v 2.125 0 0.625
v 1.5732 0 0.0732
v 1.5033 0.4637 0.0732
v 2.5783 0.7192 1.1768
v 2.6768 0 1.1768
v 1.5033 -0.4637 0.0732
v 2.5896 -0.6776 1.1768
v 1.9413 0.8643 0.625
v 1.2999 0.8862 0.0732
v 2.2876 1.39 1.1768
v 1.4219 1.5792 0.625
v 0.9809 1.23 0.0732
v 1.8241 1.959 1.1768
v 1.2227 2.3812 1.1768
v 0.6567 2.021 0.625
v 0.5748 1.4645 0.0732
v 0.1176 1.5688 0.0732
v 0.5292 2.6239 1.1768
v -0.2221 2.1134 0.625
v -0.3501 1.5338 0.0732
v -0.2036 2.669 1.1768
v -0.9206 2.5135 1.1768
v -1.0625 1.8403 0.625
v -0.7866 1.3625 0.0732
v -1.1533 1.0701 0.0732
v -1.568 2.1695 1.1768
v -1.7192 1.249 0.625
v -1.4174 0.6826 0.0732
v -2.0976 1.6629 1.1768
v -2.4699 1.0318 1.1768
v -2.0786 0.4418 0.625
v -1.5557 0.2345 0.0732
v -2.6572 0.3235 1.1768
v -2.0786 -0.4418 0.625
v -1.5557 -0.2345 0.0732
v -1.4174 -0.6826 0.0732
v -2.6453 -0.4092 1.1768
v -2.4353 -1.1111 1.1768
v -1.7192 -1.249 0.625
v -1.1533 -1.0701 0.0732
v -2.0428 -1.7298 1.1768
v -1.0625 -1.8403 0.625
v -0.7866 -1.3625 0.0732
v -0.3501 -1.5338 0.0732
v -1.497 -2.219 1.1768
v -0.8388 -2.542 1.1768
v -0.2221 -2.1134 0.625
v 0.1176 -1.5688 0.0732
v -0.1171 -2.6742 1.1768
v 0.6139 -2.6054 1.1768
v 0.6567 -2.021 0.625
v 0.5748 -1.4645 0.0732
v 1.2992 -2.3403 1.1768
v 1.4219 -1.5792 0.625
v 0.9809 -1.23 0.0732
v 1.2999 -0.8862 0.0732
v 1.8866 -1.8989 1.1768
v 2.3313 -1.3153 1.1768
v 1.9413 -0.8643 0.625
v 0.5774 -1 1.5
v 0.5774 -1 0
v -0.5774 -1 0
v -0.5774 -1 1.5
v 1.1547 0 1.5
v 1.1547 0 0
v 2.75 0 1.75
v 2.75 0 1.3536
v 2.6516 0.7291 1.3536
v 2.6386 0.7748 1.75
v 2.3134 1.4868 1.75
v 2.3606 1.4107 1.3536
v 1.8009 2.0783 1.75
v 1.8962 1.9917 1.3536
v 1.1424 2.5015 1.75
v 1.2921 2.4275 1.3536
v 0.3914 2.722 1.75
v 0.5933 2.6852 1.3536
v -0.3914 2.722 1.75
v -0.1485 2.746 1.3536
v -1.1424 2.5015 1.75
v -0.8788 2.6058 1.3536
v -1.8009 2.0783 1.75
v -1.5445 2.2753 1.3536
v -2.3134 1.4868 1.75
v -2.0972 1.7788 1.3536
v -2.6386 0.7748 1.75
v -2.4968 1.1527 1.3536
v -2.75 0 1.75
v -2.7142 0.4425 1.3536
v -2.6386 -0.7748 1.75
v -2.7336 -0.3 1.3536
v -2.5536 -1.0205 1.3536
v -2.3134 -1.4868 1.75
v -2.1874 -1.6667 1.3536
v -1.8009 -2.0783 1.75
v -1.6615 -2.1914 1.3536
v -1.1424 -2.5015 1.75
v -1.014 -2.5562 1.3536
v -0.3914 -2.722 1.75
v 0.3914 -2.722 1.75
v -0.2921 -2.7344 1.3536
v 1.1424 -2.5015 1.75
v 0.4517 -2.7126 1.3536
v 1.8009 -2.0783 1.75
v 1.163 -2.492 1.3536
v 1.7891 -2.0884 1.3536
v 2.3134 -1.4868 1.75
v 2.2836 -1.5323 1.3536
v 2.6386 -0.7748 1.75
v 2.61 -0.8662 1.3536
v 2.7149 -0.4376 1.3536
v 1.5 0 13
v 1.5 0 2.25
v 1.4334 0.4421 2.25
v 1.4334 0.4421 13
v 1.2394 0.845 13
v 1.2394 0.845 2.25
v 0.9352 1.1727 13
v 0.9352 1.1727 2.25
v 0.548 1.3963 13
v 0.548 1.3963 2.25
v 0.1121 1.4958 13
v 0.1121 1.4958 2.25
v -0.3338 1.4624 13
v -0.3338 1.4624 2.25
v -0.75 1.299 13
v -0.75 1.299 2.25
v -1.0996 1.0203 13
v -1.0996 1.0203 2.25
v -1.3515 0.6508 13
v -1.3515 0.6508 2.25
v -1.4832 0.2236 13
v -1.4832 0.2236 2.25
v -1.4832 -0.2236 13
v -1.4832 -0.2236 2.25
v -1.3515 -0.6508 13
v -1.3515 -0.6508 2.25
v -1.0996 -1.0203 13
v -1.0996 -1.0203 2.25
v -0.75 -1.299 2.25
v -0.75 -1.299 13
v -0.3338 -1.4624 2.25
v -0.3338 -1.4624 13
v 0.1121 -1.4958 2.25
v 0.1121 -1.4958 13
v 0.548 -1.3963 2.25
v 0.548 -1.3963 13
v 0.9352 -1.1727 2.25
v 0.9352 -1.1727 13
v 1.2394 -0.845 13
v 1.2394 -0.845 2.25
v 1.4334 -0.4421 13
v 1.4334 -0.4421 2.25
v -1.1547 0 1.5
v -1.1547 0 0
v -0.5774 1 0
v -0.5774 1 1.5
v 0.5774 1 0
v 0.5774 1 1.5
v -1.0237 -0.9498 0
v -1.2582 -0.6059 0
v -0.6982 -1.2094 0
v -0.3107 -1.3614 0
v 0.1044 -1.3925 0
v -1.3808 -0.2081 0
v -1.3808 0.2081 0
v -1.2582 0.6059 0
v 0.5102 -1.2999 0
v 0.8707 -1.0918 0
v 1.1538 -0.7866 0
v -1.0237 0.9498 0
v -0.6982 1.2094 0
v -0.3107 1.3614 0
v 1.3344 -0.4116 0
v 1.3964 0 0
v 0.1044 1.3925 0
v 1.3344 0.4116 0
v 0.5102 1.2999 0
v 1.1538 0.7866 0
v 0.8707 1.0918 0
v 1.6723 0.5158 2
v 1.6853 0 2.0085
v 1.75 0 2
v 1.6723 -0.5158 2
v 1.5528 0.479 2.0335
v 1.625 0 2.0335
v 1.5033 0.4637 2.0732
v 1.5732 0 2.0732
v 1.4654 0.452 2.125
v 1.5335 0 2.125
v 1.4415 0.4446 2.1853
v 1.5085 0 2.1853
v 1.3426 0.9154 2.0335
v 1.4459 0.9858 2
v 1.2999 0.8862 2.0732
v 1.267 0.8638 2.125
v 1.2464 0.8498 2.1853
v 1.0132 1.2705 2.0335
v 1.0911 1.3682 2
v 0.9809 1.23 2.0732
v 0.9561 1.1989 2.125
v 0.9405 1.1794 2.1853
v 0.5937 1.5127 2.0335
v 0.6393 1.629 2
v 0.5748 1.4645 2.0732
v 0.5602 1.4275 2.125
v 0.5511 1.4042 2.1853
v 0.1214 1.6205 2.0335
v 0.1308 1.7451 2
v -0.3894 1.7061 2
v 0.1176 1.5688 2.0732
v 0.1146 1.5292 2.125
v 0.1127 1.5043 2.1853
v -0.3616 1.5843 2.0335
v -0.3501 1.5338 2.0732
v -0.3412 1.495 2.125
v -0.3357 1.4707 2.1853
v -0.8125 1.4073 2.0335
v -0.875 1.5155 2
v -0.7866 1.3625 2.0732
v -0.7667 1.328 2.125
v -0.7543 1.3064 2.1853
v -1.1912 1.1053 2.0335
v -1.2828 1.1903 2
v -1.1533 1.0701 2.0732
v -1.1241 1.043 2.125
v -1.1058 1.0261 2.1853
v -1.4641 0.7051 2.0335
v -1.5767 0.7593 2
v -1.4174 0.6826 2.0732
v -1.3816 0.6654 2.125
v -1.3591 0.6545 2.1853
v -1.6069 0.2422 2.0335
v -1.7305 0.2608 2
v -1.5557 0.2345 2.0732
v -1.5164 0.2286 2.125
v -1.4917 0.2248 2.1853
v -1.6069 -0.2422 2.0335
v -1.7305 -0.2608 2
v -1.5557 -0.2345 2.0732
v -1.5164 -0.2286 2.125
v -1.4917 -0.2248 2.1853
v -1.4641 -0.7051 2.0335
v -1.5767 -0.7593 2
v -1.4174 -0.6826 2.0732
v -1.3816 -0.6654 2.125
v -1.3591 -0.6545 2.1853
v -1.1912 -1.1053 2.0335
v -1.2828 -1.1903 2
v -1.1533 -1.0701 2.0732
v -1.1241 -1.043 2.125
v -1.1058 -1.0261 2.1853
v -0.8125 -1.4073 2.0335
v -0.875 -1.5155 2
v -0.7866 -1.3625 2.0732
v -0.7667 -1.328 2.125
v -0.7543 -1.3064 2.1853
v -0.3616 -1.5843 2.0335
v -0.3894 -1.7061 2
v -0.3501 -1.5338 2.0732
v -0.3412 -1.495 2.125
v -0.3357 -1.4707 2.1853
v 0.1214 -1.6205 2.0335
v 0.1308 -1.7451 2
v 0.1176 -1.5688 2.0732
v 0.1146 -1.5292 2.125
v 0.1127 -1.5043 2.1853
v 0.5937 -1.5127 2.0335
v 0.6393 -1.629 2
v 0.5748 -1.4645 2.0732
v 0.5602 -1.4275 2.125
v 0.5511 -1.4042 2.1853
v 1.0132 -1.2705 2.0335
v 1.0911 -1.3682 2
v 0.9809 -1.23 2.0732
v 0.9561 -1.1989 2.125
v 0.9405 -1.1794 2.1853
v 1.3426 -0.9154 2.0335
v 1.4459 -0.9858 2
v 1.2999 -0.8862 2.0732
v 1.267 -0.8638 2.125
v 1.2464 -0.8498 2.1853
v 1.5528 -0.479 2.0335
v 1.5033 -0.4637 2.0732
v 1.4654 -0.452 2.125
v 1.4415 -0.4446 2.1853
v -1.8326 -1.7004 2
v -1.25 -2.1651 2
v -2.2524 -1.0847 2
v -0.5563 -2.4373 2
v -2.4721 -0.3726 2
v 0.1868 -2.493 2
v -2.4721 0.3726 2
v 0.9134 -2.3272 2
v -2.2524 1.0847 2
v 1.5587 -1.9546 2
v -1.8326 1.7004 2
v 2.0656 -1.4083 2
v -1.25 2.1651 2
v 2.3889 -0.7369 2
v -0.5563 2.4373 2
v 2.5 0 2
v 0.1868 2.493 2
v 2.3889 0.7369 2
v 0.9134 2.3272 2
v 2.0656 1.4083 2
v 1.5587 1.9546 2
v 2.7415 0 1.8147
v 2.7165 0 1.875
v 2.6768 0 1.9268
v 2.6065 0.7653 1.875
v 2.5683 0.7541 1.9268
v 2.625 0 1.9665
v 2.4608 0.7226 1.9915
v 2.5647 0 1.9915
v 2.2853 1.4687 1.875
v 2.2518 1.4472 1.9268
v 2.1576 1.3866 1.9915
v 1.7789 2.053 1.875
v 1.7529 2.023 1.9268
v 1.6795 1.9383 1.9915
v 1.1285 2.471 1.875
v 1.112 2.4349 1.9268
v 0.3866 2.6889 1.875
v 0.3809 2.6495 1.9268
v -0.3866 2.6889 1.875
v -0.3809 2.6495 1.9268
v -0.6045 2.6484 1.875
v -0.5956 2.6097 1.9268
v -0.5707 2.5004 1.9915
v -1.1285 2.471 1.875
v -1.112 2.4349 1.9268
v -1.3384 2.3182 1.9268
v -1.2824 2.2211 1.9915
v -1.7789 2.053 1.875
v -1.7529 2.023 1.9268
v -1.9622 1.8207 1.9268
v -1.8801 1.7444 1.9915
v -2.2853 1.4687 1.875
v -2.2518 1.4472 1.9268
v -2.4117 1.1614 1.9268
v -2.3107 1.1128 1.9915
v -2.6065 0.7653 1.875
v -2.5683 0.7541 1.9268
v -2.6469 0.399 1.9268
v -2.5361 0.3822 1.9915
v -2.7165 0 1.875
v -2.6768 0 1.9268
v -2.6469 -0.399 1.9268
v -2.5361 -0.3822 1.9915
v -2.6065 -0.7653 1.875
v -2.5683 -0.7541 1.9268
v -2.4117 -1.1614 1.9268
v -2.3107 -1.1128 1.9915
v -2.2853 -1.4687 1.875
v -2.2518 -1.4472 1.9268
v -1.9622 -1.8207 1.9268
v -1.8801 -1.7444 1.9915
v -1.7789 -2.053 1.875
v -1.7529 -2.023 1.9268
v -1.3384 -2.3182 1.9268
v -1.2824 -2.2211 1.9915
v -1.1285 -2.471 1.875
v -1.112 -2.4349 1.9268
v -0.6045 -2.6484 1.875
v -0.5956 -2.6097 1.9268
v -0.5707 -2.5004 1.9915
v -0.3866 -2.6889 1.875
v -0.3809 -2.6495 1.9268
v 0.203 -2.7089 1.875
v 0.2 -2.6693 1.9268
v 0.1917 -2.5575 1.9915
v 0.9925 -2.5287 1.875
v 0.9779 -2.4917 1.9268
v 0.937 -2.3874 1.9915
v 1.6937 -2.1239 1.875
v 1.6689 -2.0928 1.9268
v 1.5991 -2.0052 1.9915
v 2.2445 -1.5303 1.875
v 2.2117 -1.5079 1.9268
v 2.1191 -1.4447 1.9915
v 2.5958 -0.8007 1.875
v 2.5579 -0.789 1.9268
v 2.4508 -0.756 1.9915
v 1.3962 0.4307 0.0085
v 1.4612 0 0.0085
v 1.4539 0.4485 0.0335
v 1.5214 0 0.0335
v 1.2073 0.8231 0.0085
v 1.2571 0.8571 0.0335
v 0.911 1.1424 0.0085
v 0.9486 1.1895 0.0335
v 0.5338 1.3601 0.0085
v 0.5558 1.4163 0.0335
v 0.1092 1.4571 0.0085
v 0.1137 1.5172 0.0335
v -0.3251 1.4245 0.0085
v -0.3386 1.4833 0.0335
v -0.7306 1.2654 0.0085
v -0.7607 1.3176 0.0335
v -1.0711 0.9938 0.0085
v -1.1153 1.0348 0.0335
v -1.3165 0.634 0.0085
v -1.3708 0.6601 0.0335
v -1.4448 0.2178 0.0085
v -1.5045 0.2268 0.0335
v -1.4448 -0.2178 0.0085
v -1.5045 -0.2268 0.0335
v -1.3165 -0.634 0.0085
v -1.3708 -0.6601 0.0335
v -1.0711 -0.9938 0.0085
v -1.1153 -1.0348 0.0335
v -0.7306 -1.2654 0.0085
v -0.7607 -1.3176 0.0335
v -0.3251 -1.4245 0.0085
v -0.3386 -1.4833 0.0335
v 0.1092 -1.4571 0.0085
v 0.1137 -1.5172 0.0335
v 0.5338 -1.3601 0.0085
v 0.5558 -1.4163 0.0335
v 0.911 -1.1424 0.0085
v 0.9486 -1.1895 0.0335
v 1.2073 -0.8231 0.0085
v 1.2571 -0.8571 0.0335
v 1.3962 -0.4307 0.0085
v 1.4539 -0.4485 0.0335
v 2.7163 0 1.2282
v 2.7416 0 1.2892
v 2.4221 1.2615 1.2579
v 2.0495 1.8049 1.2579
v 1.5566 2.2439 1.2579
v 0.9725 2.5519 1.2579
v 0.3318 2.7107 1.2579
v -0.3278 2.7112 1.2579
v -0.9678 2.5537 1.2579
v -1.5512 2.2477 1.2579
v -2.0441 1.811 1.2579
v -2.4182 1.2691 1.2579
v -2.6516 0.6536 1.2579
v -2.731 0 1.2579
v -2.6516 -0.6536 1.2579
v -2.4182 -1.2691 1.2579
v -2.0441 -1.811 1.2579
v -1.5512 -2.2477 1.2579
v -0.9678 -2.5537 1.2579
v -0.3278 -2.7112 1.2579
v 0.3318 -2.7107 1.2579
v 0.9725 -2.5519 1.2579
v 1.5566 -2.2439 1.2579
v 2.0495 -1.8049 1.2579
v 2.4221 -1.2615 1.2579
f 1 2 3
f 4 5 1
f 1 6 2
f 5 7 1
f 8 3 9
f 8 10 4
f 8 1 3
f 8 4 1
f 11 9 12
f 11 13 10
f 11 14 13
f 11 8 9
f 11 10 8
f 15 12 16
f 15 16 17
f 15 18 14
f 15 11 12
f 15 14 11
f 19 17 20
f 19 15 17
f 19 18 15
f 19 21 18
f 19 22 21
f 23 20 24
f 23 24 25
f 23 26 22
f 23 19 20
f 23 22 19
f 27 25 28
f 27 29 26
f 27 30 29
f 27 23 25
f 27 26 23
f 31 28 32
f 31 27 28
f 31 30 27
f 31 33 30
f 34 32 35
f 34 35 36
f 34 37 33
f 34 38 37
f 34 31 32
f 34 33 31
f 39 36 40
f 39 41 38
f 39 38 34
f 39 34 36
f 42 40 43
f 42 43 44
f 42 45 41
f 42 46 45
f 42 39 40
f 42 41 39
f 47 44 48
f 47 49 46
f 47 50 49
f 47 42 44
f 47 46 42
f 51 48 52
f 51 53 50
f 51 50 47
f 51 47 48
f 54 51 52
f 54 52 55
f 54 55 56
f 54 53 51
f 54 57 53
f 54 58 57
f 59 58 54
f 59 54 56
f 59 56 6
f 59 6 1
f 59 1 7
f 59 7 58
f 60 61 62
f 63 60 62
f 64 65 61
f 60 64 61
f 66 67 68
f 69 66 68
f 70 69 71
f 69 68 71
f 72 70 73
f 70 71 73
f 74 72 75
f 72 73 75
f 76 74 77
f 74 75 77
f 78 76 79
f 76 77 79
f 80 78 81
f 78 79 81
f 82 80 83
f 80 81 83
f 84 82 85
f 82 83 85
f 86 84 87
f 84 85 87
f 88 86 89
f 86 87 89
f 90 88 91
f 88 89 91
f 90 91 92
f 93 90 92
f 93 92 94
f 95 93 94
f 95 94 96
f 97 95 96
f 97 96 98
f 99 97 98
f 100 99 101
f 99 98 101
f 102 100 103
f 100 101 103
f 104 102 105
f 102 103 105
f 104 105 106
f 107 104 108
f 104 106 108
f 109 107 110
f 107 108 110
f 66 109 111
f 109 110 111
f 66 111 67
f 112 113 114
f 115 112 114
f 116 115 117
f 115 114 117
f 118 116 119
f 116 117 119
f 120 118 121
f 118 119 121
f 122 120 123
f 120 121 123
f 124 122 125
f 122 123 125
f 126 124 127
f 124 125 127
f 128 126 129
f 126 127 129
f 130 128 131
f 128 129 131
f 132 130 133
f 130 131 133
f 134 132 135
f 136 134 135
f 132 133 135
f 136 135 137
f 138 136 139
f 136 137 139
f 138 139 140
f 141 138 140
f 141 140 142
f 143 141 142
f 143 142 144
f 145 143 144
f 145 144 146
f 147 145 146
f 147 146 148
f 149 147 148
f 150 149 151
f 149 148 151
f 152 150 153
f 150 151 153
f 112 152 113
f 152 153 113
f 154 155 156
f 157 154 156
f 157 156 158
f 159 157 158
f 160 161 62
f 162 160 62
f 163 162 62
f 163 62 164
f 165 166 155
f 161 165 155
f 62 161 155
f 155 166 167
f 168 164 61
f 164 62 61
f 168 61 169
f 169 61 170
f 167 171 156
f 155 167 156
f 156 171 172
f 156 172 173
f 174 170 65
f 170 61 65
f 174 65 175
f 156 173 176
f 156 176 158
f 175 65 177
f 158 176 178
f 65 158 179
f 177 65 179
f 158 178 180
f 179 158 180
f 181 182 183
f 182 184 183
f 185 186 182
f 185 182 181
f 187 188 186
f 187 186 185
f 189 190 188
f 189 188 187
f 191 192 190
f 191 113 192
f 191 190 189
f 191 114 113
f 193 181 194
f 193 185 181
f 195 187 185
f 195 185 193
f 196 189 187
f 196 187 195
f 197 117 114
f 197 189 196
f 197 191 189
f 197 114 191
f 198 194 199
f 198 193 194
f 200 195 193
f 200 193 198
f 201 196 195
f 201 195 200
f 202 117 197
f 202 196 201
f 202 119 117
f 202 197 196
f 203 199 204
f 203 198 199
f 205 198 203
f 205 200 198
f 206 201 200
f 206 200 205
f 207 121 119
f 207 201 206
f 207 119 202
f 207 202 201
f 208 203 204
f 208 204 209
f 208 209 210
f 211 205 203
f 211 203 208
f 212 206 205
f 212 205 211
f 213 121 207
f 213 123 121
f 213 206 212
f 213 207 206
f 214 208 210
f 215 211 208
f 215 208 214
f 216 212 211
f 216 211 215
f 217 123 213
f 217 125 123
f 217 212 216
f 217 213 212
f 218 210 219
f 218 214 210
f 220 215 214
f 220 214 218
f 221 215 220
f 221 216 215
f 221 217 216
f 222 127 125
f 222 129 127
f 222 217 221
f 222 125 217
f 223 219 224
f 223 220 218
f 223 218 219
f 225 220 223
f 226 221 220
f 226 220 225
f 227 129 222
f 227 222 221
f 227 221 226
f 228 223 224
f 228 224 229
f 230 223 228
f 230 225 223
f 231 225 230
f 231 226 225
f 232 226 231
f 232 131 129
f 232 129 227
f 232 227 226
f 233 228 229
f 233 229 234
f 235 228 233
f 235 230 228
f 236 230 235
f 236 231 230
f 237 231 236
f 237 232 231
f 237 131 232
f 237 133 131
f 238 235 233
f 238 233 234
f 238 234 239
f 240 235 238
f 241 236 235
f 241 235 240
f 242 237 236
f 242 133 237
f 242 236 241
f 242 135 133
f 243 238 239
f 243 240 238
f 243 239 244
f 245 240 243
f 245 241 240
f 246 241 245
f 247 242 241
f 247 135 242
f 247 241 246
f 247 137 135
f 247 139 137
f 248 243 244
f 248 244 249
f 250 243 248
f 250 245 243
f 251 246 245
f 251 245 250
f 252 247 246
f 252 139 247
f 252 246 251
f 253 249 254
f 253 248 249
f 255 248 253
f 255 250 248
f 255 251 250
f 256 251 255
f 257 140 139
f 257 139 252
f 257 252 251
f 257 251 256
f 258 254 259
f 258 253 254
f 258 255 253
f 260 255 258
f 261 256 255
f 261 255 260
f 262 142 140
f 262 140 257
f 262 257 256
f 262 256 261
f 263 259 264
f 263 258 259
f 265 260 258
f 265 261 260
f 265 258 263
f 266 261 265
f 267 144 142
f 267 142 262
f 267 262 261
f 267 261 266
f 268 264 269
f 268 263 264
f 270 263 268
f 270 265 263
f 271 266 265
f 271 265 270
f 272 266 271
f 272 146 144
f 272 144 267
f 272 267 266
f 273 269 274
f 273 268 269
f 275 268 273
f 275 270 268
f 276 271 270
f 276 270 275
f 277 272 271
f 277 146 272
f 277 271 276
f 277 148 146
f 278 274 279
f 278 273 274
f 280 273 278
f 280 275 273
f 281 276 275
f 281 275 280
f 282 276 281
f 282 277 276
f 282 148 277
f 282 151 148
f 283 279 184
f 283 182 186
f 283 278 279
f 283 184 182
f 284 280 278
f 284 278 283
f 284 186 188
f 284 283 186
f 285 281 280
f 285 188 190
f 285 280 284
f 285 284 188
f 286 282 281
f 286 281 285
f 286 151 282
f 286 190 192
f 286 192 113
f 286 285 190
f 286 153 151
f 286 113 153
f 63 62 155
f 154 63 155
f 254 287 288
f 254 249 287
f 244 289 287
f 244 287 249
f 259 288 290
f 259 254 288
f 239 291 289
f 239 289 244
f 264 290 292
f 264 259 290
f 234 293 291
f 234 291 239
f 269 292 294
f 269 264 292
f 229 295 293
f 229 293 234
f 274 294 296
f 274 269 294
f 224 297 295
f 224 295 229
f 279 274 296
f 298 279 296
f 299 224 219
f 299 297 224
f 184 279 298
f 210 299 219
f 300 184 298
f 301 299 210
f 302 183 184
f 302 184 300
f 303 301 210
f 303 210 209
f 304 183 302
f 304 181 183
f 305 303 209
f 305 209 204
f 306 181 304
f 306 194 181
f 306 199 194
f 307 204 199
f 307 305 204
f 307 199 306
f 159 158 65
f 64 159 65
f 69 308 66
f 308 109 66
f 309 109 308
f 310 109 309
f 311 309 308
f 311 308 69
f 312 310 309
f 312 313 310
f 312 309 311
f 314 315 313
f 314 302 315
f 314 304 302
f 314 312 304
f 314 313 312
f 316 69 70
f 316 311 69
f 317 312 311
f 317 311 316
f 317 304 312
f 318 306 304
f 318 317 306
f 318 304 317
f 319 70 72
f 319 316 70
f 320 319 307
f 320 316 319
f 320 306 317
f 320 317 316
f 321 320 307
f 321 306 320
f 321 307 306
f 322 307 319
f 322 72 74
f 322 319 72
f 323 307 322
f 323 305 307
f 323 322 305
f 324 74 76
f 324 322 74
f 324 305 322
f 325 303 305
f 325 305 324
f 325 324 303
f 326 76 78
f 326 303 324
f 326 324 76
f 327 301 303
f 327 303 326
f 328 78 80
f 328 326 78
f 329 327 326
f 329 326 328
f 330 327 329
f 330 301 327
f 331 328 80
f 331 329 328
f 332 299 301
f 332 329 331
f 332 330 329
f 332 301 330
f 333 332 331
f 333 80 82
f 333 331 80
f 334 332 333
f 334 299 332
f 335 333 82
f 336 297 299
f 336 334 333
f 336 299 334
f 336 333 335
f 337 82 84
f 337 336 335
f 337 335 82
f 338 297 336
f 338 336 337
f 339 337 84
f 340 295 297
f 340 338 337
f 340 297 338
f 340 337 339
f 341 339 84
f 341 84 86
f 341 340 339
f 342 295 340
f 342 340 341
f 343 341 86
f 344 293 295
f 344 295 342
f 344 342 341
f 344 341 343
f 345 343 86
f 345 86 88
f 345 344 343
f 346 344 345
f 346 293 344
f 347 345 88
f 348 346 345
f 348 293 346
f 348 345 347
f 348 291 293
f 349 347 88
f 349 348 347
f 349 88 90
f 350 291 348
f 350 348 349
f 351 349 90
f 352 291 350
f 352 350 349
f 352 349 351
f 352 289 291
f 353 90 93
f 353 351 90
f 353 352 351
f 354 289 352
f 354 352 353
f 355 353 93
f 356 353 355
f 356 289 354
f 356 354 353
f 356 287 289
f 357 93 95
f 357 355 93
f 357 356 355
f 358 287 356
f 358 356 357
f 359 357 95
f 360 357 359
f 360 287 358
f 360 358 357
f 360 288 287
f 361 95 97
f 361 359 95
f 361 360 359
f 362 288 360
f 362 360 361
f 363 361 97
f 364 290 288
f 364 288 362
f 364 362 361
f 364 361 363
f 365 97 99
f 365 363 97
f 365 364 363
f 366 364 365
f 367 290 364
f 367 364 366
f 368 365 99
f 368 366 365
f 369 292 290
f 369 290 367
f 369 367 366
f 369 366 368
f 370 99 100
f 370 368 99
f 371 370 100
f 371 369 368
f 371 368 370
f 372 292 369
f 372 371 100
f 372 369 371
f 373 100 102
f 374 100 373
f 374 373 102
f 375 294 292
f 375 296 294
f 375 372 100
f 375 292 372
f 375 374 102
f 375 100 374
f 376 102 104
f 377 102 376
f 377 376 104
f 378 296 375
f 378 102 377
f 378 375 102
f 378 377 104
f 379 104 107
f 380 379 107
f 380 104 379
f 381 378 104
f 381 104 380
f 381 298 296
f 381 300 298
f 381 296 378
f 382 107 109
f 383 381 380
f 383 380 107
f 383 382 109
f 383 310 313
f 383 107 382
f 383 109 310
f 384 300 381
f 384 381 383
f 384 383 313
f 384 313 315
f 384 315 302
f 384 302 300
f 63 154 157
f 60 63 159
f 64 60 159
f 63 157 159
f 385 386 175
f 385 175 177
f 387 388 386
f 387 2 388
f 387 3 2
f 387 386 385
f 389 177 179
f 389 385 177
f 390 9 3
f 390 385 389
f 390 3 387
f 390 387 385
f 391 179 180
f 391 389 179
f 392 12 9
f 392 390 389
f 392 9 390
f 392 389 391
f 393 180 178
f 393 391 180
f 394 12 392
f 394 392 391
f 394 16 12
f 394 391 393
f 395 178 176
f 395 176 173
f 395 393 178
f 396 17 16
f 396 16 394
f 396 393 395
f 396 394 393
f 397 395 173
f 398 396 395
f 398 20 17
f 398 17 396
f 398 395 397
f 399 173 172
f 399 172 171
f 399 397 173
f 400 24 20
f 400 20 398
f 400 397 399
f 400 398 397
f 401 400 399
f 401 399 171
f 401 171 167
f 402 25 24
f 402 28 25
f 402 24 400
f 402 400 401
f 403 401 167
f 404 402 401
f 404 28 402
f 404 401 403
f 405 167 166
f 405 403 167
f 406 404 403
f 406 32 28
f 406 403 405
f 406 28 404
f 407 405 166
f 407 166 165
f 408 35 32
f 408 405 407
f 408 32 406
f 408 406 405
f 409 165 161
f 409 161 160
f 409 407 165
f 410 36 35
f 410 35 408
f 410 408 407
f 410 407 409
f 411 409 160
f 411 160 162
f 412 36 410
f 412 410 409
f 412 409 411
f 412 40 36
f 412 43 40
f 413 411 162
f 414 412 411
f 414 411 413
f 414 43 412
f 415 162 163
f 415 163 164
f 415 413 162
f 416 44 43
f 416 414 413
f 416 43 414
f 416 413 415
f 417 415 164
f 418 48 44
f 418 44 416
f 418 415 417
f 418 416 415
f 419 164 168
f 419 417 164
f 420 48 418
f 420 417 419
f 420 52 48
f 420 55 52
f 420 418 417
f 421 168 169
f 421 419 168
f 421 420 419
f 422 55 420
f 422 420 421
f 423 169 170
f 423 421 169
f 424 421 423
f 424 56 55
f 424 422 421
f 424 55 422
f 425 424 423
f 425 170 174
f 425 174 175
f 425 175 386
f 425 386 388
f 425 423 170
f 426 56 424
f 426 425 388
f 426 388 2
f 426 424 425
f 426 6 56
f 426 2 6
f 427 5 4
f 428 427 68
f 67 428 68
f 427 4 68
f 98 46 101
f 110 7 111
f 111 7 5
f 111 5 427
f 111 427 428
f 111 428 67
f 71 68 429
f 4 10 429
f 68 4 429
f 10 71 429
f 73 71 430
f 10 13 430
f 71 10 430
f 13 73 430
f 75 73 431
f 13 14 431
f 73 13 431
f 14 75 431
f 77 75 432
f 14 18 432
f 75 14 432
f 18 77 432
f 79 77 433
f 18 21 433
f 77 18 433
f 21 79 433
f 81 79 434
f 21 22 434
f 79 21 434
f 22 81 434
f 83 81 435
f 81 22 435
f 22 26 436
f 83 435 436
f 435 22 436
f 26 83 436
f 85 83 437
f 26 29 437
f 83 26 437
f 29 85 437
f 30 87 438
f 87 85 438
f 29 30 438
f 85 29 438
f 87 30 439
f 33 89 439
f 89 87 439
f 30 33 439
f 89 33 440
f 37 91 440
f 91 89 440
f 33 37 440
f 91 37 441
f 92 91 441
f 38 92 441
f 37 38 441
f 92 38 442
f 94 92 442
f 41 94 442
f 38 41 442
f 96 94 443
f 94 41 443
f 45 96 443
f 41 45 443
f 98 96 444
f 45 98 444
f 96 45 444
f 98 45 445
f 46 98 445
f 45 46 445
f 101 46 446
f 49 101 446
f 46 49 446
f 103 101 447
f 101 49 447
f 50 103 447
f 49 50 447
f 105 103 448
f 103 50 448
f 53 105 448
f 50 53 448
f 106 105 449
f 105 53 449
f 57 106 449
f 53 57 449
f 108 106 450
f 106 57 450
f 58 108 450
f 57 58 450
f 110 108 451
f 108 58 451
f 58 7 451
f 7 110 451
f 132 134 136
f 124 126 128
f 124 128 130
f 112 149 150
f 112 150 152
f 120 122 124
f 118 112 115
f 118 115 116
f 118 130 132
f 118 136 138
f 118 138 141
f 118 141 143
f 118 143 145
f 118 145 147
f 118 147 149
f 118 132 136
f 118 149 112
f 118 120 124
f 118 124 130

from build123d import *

# Parameters (mm, degrees)
F1_R     = 2.75
F1_R_2   = 1.5
F2_DEPTH = 2
F3_START = 1.5
F3_DEPTH = 0.5
F4_START = 2
F4_DEPTH = 11
F5_SIZE2 = 1.25
F5_SIZE  = 1.25
F6_R     = 0.25


# Not quite as in the source:
# - a feature names something its author has since deleted; it is built from what else it names


with BuildPart() as f2:
    # F1 (on Top) → F2 (new body)
    with BuildSketch(Plane.XY):
        Circle(F1_R)
        Circle(F1_R_2, mode=Mode.SUBTRACT)
        Circle(F1_R_2)
        Polygon((-0.5773502692, -1), (-1.1547005384, 0), (-0.5773502692, 1), (0.5773502692, 1), (1.1547005384, 0), (0.5773502692, -1), align=None, mode=Mode.SUBTRACT)
    extrude(amount=F2_DEPTH)

    # F1 (on Top) → F3 (join)
    with BuildSketch(Plane.XY.offset(F3_START)):
        Polygon((-0.5773502692, 1), (-1.1547005384, 0), (-0.5773502692, -1), (0.5773502692, -1), (1.1547005384, 0), (0.5773502692, 1), align=None)
    extrude(amount=F3_DEPTH)

    # F1 (on Top) → F4 (join)
    with BuildSketch(Plane.XY.offset(F4_START)):
        Circle(F1_R_2)
        Polygon((-0.5773502692, -1), (-1.1547005384, 0), (-0.5773502692, 1), (0.5773502692, 1), (1.1547005384, 0), (0.5773502692, -1), align=None, mode=Mode.SUBTRACT)
        Polygon((-0.5773502692, 1), (-1.1547005384, 0), (-0.5773502692, -1), (0.5773502692, -1), (1.1547005384, 0), (0.5773502692, 1), align=None)
    extrude(amount=F4_DEPTH)

    # F5
    f5_edges = [f2.edges().sort_by_distance(p)[0] for p in [
        (-2.75, 0, 0),
    ]]
    chamfer(f5_edges, length=F5_SIZE, length2=F5_SIZE2)

    # F6
    f6_edges = [f2.edges().sort_by_distance(p)[0] for p in [
        (-2.75, 0, 2),
        (-1.5, 0, 2),
        (-1.5, 0, 0),
        (-2.75, 0, 1.25),
    ]]
    fillet(f6_edges, radius=F6_R)


solid = f2.part
